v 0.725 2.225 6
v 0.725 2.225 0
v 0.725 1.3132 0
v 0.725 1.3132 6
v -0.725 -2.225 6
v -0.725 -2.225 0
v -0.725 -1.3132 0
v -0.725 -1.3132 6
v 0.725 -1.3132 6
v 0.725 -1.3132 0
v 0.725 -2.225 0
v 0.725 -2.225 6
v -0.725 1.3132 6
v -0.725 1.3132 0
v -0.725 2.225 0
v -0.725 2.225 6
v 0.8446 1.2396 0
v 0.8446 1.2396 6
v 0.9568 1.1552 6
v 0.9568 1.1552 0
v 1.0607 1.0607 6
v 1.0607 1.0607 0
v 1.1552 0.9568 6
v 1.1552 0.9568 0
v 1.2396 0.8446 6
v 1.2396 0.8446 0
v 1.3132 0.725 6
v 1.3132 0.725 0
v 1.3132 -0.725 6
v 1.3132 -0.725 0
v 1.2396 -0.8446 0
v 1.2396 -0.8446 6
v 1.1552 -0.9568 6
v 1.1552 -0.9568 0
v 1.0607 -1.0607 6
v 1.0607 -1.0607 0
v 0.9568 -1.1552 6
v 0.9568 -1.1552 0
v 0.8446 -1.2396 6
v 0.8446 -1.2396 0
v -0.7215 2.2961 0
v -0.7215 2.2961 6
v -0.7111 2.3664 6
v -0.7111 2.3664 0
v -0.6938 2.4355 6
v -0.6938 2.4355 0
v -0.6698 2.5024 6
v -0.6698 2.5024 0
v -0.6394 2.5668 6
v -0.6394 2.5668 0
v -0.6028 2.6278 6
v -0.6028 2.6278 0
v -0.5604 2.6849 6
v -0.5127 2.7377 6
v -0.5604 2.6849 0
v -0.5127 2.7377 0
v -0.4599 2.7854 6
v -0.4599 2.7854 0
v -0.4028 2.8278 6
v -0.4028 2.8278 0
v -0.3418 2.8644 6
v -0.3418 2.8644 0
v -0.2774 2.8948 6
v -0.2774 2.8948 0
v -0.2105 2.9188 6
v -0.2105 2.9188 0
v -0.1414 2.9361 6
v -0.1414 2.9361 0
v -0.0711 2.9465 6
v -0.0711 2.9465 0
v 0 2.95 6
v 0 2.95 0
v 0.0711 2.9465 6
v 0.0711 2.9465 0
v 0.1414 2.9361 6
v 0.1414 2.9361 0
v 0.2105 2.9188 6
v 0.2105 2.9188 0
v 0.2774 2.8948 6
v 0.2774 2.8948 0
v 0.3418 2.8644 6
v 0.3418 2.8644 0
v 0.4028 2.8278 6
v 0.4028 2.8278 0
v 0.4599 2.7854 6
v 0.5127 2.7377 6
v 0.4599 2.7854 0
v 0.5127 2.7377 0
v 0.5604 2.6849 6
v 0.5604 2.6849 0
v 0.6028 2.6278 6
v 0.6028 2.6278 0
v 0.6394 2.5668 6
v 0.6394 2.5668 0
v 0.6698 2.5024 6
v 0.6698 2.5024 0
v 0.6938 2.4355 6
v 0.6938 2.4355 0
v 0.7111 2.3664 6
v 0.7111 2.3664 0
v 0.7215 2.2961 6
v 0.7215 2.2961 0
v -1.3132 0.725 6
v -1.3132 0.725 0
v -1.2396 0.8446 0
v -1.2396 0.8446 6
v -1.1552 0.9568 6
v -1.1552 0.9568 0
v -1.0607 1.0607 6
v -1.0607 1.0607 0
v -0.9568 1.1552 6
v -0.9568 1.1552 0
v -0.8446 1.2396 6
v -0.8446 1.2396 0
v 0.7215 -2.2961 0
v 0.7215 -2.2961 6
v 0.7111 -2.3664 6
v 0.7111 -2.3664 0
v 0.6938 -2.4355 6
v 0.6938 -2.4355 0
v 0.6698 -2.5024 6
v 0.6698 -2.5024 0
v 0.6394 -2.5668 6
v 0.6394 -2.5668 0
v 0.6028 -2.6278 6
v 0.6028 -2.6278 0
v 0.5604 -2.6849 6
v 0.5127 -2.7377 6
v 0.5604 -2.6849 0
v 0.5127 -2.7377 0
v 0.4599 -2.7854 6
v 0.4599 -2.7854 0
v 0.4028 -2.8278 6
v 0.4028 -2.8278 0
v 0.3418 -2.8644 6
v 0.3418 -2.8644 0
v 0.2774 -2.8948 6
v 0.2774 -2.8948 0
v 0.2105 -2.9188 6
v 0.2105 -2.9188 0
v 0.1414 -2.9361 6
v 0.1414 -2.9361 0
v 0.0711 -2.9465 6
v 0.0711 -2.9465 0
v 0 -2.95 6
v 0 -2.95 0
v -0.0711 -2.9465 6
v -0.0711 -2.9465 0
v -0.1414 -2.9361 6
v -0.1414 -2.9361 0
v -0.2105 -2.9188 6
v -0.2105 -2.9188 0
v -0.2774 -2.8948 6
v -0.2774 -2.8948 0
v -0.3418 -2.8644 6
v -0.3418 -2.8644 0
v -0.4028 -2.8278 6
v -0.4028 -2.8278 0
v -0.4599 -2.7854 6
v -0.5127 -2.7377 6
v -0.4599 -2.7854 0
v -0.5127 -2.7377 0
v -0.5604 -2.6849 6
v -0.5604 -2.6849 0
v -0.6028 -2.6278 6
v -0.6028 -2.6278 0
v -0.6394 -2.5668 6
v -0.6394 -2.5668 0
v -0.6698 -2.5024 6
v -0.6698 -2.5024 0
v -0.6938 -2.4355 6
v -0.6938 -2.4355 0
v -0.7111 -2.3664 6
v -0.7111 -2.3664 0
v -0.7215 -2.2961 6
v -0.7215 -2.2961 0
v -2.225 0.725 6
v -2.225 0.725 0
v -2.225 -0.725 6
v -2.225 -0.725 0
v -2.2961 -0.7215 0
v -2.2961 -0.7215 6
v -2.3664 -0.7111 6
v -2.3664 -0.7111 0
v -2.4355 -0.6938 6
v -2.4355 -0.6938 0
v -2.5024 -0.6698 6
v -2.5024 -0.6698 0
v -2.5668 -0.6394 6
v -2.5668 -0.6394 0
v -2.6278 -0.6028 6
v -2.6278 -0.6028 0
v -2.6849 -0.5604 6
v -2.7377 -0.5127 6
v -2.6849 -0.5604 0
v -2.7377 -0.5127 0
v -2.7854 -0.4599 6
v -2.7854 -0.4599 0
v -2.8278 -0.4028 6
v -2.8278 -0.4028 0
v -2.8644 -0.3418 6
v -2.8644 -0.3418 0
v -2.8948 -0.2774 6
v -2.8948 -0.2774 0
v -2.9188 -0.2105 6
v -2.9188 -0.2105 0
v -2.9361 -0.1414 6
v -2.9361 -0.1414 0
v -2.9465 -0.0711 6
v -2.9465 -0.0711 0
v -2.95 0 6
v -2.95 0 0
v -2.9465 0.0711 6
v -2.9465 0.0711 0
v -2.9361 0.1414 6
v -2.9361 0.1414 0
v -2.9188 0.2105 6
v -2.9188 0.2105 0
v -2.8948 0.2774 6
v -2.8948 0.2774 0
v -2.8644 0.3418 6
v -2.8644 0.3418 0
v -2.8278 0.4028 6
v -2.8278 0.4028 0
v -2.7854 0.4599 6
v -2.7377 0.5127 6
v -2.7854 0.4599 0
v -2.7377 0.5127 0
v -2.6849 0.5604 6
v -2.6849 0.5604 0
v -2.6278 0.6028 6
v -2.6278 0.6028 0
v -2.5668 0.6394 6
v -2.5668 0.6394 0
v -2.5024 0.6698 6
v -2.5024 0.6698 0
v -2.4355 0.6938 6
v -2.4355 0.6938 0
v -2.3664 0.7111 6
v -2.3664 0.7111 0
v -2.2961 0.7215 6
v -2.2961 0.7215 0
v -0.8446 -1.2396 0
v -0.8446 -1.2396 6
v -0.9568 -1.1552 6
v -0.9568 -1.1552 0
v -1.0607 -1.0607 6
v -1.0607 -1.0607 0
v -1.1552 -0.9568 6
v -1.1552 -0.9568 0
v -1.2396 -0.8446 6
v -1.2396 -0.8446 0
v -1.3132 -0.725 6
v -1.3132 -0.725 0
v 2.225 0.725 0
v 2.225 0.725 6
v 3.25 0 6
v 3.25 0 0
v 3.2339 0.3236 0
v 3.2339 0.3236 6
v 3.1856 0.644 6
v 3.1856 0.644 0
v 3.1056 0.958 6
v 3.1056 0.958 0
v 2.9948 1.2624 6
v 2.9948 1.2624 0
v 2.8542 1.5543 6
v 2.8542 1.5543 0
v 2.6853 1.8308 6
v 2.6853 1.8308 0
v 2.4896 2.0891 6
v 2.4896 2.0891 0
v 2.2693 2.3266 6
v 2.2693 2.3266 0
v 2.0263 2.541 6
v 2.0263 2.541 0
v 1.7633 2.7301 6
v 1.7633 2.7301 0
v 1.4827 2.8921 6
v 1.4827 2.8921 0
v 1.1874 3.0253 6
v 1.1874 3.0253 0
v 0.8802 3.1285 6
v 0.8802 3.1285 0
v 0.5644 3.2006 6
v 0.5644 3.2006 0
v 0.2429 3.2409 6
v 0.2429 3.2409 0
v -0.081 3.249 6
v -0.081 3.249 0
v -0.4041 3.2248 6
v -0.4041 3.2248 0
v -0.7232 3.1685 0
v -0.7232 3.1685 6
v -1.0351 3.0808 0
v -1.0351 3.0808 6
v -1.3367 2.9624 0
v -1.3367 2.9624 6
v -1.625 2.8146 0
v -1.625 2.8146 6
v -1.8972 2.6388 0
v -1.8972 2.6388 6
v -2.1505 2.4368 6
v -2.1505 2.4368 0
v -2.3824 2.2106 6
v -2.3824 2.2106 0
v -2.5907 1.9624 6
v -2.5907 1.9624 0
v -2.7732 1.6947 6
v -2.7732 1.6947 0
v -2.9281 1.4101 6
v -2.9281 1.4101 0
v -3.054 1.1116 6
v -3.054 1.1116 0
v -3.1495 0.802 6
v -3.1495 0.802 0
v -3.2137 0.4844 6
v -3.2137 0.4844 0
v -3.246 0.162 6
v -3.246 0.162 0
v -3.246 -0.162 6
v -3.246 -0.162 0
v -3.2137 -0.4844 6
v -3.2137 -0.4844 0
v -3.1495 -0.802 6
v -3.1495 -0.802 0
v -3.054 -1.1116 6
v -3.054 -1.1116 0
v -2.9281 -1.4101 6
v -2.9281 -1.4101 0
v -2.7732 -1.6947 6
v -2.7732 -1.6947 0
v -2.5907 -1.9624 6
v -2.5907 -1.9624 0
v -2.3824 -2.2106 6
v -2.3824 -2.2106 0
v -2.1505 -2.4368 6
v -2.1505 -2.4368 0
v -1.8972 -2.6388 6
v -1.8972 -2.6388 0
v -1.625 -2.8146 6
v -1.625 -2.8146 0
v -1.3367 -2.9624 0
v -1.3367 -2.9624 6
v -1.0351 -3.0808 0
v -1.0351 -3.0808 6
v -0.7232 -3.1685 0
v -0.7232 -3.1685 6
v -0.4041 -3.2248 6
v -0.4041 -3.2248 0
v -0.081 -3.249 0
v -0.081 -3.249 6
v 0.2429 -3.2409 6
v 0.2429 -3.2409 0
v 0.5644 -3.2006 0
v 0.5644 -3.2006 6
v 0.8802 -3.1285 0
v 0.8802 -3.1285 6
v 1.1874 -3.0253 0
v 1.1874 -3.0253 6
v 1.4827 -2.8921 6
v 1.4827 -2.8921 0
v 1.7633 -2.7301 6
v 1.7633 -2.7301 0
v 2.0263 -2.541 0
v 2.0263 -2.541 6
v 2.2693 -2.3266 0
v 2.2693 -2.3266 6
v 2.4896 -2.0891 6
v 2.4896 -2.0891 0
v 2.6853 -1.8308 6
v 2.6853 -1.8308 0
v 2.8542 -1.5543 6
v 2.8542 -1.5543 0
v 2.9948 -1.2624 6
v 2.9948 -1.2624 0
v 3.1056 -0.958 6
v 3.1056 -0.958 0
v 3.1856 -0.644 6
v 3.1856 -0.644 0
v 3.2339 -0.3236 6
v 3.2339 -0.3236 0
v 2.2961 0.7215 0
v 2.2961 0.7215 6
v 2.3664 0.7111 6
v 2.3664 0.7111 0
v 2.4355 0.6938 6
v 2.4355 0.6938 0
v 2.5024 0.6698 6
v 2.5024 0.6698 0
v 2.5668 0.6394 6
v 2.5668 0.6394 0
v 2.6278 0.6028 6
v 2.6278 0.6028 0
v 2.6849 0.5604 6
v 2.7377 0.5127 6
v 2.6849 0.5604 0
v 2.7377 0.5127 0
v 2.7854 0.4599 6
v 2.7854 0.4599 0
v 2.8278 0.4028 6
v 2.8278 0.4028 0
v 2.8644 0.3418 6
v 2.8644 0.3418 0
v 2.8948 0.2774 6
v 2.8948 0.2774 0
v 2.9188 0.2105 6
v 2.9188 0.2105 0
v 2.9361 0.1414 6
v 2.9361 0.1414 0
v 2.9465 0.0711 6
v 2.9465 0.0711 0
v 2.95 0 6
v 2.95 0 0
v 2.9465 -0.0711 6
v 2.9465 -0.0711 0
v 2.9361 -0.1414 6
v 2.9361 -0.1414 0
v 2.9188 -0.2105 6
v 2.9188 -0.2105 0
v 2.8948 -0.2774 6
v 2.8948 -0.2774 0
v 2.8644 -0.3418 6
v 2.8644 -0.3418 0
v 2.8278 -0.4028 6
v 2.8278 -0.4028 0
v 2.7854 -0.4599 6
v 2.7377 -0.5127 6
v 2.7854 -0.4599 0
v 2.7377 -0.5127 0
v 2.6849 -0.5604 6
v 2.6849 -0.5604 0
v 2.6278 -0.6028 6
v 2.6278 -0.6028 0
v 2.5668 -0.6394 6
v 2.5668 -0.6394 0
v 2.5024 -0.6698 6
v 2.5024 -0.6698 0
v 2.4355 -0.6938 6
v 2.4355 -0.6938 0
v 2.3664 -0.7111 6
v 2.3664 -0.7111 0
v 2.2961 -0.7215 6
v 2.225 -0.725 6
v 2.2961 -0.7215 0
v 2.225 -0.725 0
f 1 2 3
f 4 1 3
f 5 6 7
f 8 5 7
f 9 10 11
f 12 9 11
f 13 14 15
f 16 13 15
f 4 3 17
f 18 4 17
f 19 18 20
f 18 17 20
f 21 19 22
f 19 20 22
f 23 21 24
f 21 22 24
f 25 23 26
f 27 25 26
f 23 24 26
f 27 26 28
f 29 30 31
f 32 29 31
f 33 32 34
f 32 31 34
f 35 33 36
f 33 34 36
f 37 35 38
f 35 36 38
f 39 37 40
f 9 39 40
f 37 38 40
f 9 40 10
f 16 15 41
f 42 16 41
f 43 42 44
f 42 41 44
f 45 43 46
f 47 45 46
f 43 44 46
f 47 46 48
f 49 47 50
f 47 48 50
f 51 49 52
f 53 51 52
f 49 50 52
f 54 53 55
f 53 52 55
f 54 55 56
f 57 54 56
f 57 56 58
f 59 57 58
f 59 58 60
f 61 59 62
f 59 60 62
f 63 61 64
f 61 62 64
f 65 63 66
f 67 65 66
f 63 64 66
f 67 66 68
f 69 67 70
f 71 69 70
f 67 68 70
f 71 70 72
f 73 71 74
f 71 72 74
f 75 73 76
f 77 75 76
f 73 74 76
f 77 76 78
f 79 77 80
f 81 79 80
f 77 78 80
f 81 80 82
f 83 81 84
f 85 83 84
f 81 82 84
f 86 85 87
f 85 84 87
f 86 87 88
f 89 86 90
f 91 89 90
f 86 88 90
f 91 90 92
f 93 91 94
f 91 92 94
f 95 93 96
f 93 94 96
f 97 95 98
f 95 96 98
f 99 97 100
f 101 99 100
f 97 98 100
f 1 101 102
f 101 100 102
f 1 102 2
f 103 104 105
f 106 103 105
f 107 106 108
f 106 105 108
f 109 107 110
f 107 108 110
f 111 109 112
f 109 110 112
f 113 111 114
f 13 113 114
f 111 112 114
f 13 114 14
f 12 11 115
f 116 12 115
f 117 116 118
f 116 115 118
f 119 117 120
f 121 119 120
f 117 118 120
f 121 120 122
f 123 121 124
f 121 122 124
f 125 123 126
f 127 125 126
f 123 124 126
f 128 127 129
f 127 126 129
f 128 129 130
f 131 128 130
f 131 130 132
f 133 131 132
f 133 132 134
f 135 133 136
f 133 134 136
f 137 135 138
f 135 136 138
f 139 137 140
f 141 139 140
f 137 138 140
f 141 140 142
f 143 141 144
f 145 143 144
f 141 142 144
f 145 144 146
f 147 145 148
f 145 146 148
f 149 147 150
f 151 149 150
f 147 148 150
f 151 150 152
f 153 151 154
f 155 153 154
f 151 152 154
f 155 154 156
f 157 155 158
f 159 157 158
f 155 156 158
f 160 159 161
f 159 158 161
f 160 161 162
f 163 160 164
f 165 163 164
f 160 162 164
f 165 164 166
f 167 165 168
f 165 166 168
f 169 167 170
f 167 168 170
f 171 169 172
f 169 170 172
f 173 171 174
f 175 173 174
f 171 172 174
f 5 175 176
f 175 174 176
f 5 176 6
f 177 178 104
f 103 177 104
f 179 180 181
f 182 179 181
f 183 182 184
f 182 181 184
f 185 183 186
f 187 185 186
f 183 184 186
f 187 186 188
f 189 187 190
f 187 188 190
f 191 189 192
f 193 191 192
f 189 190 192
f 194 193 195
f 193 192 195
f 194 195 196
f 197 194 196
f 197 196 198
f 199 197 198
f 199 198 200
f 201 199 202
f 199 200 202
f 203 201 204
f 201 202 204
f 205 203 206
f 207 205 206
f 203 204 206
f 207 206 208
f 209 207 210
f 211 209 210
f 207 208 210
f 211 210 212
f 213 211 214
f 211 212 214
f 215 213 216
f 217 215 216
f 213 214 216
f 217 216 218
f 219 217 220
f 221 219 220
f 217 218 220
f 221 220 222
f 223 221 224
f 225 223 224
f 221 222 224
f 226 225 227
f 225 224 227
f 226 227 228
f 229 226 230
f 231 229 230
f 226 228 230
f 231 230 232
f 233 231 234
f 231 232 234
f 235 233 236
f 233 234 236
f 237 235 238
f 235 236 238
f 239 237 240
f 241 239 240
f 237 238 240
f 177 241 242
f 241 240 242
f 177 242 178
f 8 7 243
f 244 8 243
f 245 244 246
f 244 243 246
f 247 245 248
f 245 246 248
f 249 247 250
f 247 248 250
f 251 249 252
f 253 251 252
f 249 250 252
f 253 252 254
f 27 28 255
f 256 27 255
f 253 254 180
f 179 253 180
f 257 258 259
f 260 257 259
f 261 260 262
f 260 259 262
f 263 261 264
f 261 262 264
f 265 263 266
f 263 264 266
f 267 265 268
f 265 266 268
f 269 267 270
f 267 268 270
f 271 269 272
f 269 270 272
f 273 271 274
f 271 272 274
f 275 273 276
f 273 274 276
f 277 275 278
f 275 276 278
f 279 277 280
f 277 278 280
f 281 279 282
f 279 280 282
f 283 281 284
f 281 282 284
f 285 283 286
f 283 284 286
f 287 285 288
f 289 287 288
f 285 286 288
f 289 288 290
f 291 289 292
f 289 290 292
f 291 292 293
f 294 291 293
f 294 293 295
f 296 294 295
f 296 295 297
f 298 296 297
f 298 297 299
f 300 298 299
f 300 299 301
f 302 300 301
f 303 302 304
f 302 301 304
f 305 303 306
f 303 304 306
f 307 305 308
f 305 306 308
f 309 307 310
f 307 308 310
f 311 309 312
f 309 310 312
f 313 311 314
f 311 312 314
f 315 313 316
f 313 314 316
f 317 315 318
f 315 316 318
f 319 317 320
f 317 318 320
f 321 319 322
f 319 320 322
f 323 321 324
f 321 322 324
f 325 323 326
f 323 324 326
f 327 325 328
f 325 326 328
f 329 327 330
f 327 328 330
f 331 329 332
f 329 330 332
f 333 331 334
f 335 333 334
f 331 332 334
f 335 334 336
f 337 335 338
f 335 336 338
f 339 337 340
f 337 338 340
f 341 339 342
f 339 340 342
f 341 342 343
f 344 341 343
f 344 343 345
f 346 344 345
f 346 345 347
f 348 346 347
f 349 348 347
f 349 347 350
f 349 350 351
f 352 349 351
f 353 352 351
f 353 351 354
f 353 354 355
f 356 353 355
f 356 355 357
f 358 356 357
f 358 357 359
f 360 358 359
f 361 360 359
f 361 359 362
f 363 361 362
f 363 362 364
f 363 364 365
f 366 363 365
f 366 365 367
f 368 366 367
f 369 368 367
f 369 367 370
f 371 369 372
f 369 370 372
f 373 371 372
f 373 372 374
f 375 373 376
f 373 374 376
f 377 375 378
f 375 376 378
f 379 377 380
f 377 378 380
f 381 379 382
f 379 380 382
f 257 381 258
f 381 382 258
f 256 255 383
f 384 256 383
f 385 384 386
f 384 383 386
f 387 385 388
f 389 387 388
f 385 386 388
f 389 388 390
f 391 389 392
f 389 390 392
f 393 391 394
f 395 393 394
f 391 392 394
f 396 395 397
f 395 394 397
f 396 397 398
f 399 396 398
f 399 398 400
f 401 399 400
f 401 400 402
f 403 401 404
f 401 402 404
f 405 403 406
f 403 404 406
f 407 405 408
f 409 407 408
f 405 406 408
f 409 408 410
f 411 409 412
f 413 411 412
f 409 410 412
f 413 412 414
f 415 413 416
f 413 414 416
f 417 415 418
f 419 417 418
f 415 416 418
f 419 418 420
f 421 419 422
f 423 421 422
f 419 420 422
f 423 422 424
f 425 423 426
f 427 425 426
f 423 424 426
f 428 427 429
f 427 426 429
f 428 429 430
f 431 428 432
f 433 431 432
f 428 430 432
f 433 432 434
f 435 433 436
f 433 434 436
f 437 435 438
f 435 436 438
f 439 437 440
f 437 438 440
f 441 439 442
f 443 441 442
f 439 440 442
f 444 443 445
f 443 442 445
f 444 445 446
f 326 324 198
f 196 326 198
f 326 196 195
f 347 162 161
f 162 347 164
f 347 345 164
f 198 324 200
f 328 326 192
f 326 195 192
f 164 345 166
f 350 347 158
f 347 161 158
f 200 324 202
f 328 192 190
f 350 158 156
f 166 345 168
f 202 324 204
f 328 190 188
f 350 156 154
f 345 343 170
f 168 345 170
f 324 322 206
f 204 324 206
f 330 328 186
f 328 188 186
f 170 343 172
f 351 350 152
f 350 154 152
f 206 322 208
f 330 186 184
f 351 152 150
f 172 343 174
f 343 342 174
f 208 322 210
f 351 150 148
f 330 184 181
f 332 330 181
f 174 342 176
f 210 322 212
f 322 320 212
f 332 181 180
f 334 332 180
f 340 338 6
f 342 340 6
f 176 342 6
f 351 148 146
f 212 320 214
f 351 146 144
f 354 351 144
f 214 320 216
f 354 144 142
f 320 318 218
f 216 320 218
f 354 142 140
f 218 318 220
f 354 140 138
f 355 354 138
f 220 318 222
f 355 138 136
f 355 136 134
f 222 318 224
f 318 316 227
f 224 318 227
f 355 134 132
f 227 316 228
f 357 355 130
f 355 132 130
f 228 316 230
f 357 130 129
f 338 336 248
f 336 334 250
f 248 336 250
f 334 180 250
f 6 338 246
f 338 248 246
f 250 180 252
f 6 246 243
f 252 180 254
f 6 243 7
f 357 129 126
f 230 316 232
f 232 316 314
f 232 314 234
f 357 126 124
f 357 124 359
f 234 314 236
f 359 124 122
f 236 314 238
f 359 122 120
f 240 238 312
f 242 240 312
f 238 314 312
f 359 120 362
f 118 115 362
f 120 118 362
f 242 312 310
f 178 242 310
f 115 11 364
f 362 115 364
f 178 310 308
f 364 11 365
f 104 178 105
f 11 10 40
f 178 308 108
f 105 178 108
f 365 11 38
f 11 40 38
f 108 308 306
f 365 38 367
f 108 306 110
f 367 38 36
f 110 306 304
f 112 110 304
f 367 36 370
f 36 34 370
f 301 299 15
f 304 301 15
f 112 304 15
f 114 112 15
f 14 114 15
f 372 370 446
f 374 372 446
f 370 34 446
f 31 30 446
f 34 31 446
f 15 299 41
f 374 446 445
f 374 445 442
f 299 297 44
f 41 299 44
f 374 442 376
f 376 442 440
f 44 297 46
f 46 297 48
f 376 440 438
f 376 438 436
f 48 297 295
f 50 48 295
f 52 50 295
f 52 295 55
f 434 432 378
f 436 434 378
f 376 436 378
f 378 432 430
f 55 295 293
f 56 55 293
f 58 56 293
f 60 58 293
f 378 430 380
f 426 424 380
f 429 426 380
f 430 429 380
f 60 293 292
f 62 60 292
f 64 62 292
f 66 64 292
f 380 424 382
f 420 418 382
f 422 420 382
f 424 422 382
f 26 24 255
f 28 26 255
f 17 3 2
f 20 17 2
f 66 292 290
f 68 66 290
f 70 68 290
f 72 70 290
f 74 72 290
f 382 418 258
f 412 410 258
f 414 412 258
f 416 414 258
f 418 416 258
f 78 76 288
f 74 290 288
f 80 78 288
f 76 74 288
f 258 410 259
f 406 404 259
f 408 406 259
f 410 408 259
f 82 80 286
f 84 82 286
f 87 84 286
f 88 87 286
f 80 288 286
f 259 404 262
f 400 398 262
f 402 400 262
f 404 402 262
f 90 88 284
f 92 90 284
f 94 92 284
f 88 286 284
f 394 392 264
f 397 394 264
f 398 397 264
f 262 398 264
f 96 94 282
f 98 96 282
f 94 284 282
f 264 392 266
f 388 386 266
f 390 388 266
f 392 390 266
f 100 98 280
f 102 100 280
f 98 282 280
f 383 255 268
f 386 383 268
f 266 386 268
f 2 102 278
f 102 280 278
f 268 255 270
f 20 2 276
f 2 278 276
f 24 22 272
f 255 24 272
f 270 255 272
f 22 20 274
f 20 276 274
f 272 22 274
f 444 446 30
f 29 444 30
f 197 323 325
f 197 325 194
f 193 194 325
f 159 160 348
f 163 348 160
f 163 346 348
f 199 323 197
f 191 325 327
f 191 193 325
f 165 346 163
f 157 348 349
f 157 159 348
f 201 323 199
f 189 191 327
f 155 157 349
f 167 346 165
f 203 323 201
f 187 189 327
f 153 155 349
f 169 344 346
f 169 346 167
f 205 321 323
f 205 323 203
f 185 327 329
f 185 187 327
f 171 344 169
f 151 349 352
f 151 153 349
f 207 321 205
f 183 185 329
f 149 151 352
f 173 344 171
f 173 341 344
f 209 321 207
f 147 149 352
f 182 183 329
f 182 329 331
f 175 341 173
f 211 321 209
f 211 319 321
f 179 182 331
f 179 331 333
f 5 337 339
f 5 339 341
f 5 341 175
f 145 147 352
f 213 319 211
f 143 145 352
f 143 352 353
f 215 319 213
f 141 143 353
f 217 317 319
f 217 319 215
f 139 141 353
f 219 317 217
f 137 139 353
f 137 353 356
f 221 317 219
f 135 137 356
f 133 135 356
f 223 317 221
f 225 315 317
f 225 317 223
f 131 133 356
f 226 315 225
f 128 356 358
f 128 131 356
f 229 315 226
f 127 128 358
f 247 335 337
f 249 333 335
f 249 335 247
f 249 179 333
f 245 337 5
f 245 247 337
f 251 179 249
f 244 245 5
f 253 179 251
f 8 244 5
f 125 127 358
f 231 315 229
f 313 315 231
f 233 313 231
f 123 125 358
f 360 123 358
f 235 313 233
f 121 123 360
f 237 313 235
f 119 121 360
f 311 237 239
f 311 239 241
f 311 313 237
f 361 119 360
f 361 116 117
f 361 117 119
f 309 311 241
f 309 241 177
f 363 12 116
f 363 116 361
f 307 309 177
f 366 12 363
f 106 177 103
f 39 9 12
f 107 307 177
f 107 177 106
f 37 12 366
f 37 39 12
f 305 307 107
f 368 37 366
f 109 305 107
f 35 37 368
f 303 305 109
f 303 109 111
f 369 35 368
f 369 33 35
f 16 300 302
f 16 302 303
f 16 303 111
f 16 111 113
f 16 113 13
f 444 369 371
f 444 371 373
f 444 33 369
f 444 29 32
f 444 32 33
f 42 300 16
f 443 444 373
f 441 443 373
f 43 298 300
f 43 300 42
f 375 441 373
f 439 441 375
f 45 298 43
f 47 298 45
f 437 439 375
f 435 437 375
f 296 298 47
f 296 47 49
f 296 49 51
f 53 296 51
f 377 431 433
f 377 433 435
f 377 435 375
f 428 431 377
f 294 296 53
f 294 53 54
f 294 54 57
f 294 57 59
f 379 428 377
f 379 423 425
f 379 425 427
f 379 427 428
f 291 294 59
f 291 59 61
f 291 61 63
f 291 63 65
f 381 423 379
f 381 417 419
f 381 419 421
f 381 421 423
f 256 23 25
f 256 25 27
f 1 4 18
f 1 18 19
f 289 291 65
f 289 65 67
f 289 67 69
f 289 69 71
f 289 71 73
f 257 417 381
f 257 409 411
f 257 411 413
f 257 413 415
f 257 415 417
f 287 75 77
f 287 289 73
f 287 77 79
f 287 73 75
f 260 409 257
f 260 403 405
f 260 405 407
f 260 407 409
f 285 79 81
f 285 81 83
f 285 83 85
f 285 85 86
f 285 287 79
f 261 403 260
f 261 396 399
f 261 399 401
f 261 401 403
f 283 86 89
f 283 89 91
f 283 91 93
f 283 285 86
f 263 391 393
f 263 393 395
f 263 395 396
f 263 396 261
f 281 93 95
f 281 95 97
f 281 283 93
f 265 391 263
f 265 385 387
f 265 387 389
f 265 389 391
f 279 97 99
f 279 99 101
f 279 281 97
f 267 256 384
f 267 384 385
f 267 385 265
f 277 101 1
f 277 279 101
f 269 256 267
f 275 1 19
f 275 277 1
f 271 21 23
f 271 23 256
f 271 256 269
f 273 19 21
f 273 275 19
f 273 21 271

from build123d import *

# Parameters (mm, degrees)
ESQUISSE1_R        = 3.25
BOSS_EXTRU_1_DEPTH = 6


with BuildPart() as part:
    # Esquisse1 → Boss.-Extru.1 (new body)
    with BuildSketch(Plane.XY):
        Circle(ESQUISSE1_R)
        with BuildLine():
            Line((2.225, -0.725), (1.313154599, -0.725))
            ThreePointArc((1.313154599, -0.725), (1.060660172, -1.060660172), (0.725, -1.313154599))
            Line((0.725, -1.313154599), (0.725, -2.225))
            ThreePointArc((0.725, -2.225), (0, -2.95), (-0.725, -2.225))
            Line((-0.725, -2.225), (-0.725, -1.313154599))
            ThreePointArc((-0.725, -1.313154599), (-1.060660172, -1.060660172), (-1.313154599, -0.725))
            Line((-1.313154599, -0.725), (-2.225, -0.725))
            ThreePointArc((-2.225, -0.725), (-2.95, 0), (-2.225, 0.725))
            Line((-2.225, 0.725), (-1.313154599, 0.725))
            ThreePointArc((-1.313154599, 0.725), (-1.060660172, 1.060660172), (-0.725, 1.313154599))
            Line((-0.725, 1.313154599), (-0.725, 2.225))
            ThreePointArc((-0.725, 2.225), (0, 2.95), (0.725, 2.225))
            Line((0.725, 2.225), (0.725, 1.313154599))
            ThreePointArc((0.725, 1.313154599), (1.060660172, 1.060660172), (1.313154599, 0.725))
            Line((1.313154599, 0.725), (2.225, 0.725))
            ThreePointArc((2.225, 0.725), (2.95, 0), (2.225, -0.725))
        make_face(mode=Mode.SUBTRACT)
    extrude(amount=BOSS_EXTRU_1_DEPTH)


solid = part.part
